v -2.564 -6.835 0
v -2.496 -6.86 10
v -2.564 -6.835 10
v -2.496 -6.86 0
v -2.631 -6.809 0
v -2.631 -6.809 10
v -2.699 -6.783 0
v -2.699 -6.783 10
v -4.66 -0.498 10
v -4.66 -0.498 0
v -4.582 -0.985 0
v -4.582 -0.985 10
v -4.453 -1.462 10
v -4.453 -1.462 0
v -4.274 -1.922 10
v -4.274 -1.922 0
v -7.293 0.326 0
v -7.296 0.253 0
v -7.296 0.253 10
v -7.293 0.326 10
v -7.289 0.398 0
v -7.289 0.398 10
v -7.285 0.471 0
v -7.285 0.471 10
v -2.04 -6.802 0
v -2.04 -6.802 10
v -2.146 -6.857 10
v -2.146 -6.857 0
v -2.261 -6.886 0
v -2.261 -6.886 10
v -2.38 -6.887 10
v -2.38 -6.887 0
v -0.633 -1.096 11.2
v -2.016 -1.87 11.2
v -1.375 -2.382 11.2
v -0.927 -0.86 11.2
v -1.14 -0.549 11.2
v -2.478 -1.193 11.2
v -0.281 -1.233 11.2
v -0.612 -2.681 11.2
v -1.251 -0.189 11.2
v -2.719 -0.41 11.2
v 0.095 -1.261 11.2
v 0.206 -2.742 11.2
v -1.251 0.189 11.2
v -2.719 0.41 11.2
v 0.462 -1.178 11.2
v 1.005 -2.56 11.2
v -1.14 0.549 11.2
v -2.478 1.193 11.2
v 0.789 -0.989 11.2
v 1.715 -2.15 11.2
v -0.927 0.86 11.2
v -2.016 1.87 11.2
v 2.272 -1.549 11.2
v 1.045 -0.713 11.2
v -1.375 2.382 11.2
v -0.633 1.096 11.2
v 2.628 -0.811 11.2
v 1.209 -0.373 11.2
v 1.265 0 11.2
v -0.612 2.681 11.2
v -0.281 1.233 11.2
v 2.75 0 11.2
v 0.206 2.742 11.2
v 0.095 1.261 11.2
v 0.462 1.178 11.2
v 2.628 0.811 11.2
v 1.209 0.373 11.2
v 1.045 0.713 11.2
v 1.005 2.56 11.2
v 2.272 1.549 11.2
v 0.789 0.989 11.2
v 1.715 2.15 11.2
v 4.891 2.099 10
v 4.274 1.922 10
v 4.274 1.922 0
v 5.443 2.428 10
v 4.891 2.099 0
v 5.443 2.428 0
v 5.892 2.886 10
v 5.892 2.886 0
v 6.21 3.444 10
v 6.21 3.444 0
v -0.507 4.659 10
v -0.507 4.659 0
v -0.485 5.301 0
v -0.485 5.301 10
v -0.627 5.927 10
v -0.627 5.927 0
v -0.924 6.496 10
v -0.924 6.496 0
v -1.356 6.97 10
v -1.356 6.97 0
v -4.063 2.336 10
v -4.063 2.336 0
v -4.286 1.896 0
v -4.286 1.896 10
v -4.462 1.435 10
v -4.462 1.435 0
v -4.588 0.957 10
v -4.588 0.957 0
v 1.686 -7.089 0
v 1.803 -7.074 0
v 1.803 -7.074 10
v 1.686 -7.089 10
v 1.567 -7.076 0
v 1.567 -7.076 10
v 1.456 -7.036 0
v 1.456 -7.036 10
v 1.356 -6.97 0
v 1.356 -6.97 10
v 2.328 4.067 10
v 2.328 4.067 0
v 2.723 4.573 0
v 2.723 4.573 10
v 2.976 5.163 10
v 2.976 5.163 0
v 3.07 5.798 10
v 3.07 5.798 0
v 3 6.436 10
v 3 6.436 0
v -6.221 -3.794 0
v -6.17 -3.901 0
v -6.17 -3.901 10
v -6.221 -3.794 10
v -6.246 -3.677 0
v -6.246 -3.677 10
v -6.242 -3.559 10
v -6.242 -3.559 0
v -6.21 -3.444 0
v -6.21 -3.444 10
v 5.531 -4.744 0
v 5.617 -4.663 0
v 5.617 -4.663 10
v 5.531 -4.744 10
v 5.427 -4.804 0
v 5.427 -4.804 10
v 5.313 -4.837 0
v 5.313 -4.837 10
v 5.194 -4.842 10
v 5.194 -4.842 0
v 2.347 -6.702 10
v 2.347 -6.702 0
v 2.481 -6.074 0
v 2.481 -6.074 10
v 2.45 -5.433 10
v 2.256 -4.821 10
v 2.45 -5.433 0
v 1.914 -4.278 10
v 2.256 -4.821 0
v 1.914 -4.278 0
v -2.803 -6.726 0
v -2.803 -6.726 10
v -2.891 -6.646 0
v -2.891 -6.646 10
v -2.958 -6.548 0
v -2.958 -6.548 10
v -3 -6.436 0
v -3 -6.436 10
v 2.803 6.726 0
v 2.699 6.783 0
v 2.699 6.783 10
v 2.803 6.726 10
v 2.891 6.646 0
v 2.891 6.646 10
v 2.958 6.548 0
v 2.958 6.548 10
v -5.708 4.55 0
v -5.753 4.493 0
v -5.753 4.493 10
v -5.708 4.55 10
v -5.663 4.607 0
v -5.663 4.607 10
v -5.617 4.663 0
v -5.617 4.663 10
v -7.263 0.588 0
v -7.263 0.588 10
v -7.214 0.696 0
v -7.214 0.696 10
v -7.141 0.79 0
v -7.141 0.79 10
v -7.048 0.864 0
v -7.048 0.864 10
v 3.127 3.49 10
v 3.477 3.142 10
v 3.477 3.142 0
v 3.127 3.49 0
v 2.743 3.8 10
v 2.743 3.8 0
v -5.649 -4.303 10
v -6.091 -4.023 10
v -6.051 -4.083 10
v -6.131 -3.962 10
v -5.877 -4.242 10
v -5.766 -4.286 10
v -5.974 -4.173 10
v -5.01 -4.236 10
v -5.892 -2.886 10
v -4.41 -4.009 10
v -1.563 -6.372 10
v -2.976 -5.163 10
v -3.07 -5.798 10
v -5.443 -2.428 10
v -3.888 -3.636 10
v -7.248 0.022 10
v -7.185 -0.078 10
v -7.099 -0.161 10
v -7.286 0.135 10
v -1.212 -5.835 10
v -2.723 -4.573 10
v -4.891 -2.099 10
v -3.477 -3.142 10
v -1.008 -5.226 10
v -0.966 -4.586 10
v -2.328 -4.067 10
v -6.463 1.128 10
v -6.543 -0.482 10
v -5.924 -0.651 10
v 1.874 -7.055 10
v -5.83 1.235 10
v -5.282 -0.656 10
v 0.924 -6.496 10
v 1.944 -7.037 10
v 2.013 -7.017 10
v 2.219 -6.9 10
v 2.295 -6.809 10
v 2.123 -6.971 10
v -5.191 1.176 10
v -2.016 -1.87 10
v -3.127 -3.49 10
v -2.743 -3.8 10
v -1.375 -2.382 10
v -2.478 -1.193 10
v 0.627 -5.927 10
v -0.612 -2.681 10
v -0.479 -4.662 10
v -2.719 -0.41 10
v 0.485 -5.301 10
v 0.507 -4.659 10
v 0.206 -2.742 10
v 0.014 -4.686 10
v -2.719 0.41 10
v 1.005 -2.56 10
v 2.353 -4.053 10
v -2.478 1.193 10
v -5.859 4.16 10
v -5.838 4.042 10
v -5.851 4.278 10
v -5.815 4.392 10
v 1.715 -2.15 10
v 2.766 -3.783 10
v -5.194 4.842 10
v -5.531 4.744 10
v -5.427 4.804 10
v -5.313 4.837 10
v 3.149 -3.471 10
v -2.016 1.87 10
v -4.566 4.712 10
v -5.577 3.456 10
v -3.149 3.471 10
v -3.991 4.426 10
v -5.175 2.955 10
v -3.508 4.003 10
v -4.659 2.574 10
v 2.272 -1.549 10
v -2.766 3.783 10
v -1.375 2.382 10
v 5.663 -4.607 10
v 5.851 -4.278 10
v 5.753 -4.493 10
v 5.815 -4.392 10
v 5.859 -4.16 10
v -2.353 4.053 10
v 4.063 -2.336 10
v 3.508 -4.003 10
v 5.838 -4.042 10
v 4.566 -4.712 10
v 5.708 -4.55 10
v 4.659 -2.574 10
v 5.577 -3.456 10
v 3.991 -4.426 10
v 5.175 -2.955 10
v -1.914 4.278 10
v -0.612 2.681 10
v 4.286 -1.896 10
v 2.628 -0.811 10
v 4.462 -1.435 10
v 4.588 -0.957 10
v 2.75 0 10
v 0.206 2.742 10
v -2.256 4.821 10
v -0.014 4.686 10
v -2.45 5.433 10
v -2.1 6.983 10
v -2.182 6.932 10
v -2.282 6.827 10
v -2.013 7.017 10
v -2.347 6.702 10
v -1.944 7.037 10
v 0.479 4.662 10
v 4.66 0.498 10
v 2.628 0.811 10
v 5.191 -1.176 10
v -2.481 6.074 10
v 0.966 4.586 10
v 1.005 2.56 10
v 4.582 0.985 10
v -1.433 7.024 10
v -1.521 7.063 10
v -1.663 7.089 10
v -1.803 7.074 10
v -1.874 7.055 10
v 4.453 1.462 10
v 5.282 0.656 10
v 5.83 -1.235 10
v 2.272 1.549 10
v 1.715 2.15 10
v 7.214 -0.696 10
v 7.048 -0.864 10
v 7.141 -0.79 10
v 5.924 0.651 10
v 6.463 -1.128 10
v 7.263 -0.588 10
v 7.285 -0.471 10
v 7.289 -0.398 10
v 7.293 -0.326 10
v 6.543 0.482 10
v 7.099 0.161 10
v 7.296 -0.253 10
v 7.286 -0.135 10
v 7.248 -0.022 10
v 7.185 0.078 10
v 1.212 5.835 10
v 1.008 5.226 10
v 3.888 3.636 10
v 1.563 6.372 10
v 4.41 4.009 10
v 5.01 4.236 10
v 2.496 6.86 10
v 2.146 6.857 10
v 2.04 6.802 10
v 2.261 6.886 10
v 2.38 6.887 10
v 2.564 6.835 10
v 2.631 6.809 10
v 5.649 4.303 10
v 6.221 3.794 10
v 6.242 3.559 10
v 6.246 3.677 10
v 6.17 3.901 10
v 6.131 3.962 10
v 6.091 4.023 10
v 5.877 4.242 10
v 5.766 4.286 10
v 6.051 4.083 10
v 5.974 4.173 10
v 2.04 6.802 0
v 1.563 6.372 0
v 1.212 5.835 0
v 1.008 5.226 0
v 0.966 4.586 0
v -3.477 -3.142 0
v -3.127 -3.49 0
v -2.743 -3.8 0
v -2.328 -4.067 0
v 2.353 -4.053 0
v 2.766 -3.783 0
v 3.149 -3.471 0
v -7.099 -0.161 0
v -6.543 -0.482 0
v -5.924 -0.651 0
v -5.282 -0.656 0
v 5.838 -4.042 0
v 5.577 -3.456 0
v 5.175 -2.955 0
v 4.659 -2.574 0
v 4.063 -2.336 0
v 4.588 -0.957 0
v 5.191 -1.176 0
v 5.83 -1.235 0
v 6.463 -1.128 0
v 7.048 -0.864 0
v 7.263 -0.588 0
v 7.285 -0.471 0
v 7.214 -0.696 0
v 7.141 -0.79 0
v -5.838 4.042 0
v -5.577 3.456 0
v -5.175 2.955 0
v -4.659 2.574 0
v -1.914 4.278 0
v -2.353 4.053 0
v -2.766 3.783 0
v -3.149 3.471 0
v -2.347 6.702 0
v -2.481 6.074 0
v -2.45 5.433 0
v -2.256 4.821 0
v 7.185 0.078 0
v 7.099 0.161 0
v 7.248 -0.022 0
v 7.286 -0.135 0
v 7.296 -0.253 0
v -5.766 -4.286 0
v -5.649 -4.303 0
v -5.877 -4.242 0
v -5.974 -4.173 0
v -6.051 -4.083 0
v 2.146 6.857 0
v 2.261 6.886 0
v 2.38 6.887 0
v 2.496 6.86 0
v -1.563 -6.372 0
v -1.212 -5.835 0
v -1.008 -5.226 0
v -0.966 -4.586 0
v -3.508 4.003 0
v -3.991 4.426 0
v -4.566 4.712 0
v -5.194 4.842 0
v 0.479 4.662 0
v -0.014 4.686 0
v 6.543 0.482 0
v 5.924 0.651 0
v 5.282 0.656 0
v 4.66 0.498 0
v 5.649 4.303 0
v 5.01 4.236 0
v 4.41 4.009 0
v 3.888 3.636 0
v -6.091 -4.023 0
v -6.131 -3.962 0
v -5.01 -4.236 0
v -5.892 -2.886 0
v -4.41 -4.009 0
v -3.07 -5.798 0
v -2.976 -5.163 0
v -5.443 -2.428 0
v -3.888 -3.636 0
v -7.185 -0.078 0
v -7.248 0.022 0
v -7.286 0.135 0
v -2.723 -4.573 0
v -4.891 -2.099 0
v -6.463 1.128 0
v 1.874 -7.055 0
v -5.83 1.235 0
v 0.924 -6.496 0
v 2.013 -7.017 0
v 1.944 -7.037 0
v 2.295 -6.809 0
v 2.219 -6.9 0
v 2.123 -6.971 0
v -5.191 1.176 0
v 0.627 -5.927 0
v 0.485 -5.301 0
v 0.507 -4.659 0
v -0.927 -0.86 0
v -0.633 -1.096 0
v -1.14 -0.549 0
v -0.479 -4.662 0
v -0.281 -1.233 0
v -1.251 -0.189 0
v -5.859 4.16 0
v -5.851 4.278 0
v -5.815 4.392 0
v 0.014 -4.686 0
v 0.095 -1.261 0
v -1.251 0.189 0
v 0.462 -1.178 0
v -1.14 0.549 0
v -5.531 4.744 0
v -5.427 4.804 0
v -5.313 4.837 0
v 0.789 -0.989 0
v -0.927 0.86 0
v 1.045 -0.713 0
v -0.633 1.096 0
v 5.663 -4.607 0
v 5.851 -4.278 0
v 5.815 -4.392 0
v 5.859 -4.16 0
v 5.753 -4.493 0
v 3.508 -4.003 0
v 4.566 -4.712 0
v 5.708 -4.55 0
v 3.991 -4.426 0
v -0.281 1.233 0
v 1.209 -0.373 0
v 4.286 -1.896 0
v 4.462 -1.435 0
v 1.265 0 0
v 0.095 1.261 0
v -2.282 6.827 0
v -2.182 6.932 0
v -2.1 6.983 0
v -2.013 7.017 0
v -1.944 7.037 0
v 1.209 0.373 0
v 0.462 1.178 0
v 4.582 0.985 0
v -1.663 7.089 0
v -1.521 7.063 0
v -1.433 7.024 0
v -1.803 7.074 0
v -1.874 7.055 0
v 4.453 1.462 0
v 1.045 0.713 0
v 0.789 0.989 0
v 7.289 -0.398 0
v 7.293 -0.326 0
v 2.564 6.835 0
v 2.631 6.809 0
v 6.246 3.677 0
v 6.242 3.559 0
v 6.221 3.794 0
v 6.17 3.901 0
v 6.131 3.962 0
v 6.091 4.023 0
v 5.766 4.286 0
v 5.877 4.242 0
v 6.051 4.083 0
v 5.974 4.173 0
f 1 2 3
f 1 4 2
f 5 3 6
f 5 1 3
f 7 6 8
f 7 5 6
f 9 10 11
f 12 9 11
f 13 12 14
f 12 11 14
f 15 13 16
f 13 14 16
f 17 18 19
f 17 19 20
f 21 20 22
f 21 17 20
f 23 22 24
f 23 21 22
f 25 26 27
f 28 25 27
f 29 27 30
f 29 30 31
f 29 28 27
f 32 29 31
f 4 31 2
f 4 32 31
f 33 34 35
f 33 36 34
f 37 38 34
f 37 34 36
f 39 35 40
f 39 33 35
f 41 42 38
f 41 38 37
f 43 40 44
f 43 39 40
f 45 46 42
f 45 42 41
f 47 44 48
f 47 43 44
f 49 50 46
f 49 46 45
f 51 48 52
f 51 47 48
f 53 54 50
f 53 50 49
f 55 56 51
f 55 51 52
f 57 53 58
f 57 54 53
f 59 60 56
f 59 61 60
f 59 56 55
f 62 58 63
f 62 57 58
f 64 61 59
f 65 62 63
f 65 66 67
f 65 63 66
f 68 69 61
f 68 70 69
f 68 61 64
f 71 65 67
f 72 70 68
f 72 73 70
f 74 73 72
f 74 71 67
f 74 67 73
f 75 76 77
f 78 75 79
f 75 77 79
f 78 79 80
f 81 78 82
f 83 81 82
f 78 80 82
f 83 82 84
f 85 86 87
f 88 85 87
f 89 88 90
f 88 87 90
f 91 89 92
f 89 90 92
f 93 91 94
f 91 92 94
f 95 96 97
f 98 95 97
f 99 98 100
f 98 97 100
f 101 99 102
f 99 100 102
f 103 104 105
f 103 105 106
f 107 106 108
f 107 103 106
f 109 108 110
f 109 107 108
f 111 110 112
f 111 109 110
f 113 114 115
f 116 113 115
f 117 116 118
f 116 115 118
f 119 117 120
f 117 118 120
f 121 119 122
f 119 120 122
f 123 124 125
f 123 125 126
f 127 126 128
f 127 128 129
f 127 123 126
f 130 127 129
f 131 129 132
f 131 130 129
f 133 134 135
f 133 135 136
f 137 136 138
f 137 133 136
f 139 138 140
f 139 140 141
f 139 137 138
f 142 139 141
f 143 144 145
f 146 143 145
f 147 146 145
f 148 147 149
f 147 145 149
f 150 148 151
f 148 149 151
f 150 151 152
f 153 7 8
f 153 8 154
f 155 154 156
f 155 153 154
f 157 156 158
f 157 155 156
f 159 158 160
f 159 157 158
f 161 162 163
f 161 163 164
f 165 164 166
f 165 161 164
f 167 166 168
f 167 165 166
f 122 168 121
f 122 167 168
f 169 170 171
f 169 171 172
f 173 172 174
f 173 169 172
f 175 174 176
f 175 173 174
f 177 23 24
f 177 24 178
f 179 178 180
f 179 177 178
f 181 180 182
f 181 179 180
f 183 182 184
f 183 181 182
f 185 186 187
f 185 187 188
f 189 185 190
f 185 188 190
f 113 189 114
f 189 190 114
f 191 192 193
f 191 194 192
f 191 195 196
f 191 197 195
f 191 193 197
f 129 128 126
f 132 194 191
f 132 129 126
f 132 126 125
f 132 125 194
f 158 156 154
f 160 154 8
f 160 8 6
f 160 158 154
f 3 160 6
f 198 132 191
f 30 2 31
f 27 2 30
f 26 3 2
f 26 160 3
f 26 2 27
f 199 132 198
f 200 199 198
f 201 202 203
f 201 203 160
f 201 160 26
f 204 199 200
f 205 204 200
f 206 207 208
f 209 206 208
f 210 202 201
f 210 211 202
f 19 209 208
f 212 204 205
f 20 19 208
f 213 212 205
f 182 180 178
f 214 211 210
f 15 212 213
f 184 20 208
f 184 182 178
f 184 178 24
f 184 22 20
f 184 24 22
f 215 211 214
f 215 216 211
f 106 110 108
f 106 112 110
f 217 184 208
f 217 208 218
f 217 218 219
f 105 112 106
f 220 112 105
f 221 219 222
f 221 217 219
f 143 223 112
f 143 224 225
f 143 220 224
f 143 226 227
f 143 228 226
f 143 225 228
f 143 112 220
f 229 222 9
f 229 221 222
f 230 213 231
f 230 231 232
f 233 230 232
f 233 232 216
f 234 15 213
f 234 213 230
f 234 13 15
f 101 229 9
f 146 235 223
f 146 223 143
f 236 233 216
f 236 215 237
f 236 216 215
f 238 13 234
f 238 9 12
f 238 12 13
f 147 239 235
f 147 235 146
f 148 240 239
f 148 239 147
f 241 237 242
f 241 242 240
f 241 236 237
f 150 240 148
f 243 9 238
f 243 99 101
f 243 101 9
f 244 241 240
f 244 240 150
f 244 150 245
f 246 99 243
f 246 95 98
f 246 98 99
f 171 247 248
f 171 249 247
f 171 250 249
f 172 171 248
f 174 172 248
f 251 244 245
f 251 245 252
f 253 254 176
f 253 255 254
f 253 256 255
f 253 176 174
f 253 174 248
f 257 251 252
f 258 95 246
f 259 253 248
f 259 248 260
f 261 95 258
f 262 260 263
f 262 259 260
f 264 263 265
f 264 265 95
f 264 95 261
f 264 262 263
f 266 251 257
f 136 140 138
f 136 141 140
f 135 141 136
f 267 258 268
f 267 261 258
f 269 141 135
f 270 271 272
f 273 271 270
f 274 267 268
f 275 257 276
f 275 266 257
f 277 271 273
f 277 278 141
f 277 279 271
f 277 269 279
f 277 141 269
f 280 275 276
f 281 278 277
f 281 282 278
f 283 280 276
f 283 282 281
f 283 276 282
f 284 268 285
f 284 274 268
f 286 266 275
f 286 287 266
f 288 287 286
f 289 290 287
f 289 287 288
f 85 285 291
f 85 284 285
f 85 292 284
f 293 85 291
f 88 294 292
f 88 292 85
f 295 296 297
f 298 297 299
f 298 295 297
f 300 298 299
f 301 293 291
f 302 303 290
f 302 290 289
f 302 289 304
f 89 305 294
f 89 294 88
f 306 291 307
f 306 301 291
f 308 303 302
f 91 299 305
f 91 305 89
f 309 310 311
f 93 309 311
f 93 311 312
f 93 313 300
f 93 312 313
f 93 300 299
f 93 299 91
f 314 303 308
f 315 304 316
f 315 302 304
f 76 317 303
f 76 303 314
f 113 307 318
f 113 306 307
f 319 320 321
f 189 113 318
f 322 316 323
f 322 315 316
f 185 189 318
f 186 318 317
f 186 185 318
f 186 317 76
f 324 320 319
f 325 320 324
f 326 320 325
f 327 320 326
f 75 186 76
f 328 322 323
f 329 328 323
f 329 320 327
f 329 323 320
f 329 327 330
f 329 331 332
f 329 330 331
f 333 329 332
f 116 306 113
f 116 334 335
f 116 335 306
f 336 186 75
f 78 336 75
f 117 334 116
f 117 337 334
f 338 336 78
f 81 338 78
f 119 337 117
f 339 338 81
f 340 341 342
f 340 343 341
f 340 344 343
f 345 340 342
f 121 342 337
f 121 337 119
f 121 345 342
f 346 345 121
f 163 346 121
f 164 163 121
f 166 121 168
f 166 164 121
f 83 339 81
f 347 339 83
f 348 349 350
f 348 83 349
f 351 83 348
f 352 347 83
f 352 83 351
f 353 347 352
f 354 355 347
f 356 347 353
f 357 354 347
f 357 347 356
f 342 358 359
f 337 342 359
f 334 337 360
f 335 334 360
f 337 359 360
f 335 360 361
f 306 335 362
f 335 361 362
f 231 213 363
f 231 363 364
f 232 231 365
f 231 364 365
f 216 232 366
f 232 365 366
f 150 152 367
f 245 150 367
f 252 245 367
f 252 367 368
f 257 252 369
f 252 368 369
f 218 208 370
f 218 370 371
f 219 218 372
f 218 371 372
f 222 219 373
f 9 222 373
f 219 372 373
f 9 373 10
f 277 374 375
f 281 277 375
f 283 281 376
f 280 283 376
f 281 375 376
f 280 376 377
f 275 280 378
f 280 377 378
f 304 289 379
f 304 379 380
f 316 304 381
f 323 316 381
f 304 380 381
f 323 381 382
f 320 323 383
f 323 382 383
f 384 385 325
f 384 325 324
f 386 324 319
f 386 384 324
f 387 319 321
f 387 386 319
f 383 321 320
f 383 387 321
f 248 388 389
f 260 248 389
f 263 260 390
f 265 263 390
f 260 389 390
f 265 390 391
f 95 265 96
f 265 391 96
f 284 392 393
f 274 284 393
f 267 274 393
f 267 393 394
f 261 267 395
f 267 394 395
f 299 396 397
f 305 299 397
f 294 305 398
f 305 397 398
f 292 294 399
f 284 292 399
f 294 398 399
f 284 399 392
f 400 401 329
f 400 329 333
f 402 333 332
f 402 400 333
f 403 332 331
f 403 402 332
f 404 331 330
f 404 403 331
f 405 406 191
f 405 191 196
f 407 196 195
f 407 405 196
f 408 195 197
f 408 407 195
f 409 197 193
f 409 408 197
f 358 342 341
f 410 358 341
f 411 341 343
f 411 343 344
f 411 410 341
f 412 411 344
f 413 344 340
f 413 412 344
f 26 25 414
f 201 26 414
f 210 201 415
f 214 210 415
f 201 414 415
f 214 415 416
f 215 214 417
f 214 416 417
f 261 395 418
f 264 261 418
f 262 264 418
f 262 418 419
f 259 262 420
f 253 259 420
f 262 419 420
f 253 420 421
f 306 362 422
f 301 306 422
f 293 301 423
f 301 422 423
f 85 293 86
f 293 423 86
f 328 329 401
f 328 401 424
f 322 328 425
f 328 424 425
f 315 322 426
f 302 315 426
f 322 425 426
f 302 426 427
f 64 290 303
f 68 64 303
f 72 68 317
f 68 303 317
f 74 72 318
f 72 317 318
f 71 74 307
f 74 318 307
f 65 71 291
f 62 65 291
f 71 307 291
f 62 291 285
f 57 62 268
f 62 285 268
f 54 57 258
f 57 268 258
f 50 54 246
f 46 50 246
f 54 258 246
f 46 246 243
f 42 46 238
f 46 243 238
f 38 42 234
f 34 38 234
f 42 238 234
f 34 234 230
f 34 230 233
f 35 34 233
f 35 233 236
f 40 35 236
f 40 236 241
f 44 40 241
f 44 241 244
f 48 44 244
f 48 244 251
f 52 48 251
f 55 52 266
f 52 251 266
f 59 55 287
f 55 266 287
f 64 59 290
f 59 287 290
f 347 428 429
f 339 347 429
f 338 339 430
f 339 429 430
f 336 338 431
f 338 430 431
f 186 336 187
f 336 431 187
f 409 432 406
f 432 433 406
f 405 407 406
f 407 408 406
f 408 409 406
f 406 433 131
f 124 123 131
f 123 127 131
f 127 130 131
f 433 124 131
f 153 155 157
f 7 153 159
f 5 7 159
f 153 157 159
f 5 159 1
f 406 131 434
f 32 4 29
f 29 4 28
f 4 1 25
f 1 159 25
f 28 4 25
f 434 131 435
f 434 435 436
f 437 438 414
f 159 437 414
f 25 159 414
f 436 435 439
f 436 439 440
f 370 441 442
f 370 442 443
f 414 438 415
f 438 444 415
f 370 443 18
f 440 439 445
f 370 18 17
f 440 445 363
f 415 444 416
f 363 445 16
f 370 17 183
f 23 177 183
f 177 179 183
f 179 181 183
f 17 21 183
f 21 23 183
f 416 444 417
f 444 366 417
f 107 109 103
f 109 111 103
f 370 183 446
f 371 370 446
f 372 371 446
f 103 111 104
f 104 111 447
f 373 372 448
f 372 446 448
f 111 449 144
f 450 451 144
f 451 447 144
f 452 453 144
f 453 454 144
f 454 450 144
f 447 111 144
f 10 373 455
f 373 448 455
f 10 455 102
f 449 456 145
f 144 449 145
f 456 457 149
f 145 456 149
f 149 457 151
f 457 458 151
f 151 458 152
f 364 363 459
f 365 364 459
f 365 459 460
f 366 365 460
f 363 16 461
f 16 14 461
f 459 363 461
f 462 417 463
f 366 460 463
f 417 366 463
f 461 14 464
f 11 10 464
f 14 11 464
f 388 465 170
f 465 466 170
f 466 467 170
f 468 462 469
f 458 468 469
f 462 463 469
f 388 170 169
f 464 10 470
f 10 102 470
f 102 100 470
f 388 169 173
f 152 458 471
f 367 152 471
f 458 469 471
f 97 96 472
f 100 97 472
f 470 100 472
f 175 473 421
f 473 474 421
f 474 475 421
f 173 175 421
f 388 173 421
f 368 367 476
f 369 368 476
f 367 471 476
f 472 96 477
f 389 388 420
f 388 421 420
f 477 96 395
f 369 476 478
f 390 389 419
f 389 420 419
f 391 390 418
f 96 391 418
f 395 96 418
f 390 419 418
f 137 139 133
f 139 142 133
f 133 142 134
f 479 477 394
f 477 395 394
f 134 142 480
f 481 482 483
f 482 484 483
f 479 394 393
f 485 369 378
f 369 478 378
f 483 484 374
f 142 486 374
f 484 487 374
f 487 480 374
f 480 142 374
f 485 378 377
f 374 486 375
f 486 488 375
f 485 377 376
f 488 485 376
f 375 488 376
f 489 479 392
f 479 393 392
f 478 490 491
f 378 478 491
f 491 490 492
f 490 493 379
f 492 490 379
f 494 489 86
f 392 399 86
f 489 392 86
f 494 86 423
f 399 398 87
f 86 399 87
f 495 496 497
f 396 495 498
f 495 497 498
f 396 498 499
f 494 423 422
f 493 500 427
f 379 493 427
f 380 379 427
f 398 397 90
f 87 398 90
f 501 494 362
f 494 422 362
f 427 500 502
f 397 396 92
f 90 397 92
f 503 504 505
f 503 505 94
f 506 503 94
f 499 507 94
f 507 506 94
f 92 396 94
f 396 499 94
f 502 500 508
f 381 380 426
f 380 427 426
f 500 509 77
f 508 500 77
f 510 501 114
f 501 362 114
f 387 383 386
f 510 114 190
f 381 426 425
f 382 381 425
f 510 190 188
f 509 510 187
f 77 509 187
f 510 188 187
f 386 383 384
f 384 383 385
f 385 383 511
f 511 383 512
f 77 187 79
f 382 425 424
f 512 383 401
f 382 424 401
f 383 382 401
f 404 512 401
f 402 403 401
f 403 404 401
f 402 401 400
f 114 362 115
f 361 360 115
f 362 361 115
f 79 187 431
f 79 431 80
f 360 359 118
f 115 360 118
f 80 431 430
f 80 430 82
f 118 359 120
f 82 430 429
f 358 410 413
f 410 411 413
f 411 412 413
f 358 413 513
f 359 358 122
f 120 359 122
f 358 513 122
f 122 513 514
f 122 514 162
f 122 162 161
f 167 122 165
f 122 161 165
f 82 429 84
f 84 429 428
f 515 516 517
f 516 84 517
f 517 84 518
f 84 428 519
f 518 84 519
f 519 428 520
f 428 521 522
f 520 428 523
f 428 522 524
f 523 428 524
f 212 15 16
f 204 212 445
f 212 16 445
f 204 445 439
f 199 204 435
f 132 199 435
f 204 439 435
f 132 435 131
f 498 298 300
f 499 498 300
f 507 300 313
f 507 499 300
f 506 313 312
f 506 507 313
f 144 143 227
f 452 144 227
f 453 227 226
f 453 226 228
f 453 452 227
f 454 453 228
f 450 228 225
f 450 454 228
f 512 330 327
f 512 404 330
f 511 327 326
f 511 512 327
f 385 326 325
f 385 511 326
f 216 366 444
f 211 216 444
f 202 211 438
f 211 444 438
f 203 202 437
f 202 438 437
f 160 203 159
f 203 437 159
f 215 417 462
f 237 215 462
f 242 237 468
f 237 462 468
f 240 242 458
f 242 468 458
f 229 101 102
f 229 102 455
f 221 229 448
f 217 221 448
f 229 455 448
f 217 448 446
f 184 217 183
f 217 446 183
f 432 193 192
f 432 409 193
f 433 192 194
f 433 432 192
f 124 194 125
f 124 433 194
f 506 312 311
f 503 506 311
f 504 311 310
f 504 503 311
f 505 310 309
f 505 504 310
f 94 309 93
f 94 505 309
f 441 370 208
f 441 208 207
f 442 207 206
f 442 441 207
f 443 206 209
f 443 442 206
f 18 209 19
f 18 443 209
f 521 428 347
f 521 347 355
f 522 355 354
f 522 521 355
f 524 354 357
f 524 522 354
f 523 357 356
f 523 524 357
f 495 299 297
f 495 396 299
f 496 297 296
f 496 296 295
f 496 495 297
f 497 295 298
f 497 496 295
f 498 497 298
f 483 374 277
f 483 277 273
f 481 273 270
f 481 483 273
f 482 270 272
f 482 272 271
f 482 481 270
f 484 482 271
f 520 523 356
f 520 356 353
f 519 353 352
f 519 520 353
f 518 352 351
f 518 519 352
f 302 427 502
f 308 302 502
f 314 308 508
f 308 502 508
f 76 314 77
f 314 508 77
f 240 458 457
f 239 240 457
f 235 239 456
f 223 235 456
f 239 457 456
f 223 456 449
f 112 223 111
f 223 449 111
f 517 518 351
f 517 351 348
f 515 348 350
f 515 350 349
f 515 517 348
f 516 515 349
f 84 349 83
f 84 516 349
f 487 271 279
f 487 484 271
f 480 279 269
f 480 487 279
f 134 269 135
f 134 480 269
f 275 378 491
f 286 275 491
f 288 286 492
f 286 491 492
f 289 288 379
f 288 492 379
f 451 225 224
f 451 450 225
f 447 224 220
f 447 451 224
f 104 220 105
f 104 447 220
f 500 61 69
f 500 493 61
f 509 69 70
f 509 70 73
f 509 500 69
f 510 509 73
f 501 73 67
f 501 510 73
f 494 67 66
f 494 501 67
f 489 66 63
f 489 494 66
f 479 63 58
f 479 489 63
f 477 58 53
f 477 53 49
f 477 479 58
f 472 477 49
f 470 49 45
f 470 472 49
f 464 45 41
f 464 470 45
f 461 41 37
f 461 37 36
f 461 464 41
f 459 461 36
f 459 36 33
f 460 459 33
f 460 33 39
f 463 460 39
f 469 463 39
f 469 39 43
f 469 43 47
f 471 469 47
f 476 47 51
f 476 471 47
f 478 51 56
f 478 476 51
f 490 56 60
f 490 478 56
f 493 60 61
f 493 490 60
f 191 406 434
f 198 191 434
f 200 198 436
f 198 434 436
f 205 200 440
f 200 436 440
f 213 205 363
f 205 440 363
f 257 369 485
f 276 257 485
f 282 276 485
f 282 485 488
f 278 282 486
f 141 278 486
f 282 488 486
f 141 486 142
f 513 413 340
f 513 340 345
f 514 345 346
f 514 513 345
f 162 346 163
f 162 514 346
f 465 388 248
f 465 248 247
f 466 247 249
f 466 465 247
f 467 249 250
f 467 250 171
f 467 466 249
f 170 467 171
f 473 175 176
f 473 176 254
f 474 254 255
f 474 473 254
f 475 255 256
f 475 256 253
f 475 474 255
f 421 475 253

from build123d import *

# Parameters (mm, degrees)
SKETCH_1_R               = 1.265
EXTRUDE_1_DEPTH          = 10
SKETCH_2_R               = 2.75
SKETCH_2_R_2             = 1.265
EXTRUDE_2_DEPTH          = 1.2
SKETCH_3_R               = 10.210079725
SKETCH_3_R_2             = 7.3
CUT_EXTRUDE_2_DEPTH      = 16.316956182
FILLET_1_R               = 0.5
PATTERN_CIRCULAR_2_DEPTH = 10


# Read off the part's stored shape, not the designer's step: Круговой массив2
with BuildPart() as part:
    # Эскиз1 → Бобышка-Вытянуть1 (new body)
    with BuildSketch(Plane.XY):
        with BuildLine():
            ThreePointArc((-3.148803906, 3.471068454), (-4.227852242, 4.566214035), (-5.743712894, 4.822837566))
            ThreePointArc((-5.743712894, 4.822837566), (-5.841480421, 4.703945843), (-5.936787387, 4.583072716))
            ThreePointArc((-5.936787387, 4.583072716), (-5.362797198, 3.156810321), (-4.062728379, 2.336133637))
            ThreePointArc((-4.062728379, 2.336133637), (-4.379801209, 1.667520202), (-4.587678719, 0.95733287))
            ThreePointArc((-4.587678719, 0.95733287), (-6.104357582, 1.209075557), (-7.481554138, 0.525687819))
            ThreePointArc((-7.481554138, 0.525687819), (-7.490766927, 0.372036085), (-7.496824441, 0.218227641))
            ThreePointArc((-7.496824441, 0.218227641), (-6.194120622, -0.598259906), (-4.659961201, -0.498040012))
            ThreePointArc((-4.659961201, -0.498040012), (-4.523477392, -1.225330377), (-4.274216191, -1.922071332))
            ThreePointArc((-4.274216191, -1.922071332), (-5.649205805, -2.609888688), (-6.361695989, -3.972256807))
            ThreePointArc((-6.361695989, -3.972256807), (-6.278835069, -4.101978813), (-6.193329365, -4.229972975))
            ThreePointArc((-6.193329365, -4.229972975), (-4.659500498, -4.124815183), (-3.477247231, -3.141979304))
            ThreePointArc((-3.477247231, -3.141979304), (-2.939338959, -3.650146399), (-2.328148353, -4.067309614))
            ThreePointArc((-2.328148353, -4.067309614), (-3.03624942, -5.431964161), (-2.811886199, -6.952934345))
            ThreePointArc((-2.811886199, -6.952934345), (-2.668601624, -7.009177225), (-2.524192976, -7.062467686))
            ThreePointArc((-2.524192976, -7.062467686), (-1.345109555, -6.075831258), (-0.966343005, -4.585789294))
            ThreePointArc((-0.966343005, -4.585789294), (-0.232472948, -4.68073056), (0.507193024, -4.658973866))
            ThreePointArc((0.507193024, -4.658973866), (0.736451045, -6.179213951), (1.811968547, -7.277827285))
            ThreePointArc((1.811968547, -7.277827285), (1.960946938, -7.239108171), (2.109099336, -7.197339786))
            ThreePointArc((2.109099336, -7.197339786), (2.483067519, -5.706086302), (1.913671403, -4.277983638))
            ThreePointArc((1.913671403, -4.277983638), (2.563189827, -3.92343474), (3.148803906, -3.471068454))
            ThreePointArc((3.148803906, -3.471068454), (4.227852242, -4.566214035), (5.743712894, -4.822837566))
            ThreePointArc((5.743712894, -4.822837566), (5.841480421, -4.703945843), (5.936787387, -4.583072716))
            ThreePointArc((5.936787387, -4.583072716), (5.362797198, -3.156810321), (4.062728379, -2.336133637))
            ThreePointArc((4.062728379, -2.336133637), (4.379801209, -1.667520202), (4.587678719, -0.95733287))
            ThreePointArc((4.587678719, -0.95733287), (6.104357582, -1.209075557), (7.481554138, -0.525687819))
            ThreePointArc((7.481554138, -0.525687819), (7.490766927, -0.372036085), (7.496824441, -0.218227641))
            ThreePointArc((7.496824441, -0.218227641), (6.194120622, 0.598259906), (4.659961201, 0.498040012))
            ThreePointArc((4.659961201, 0.498040012), (4.523477392, 1.225330377), (4.274216191, 1.922071332))
            ThreePointArc((4.274216191, 1.922071332), (5.649205805, 2.609888688), (6.361695989, 3.972256807))
            ThreePointArc((6.361695989, 3.972256807), (6.278835069, 4.101978813), (6.193329365, 4.229972975))
            ThreePointArc((6.193329365, 4.229972975), (4.659500498, 4.124815183), (3.477247231, 3.141979304))
            ThreePointArc((3.477247231, 3.141979304), (2.939338959, 3.650146399), (2.328148353, 4.067309614))
            ThreePointArc((2.328148353, 4.067309614), (3.03624942, 5.431964161), (2.811886199, 6.952934345))
            ThreePointArc((2.811886199, 6.952934345), (2.668601624, 7.009177225), (2.524192976, 7.062467686))
            ThreePointArc((2.524192976, 7.062467686), (1.345109555, 6.075831258), (0.966343005, 4.585789294))
            ThreePointArc((0.966343005, 4.585789294), (0.232472948, 4.68073056), (-0.507193024, 4.658973866))
            ThreePointArc((-0.507193024, 4.658973866), (-0.736451045, 6.179213951), (-1.811968547, 7.277827285))
            ThreePointArc((-1.811968547, 7.277827285), (-1.960946938, 7.239108171), (-2.109099336, 7.197339786))
            ThreePointArc((-2.109099336, 7.197339786), (-2.483067519, 5.706086302), (-1.913671403, 4.277983638))
            ThreePointArc((-1.913671403, 4.277983638), (-2.563189827, 3.92343474), (-3.148803906, 3.471068454))
        make_face()
        Circle(SKETCH_1_R, mode=Mode.SUBTRACT)
    extrude(amount=EXTRUDE_1_DEPTH)

    # Эскиз2 → Бобышка-Вытянуть2 (add)
    with BuildSketch(Plane.XY.offset(10)):
        Circle(SKETCH_2_R)
        Circle(SKETCH_2_R_2, mode=Mode.SUBTRACT)
    extrude(amount=EXTRUDE_2_DEPTH)

    # Эскиз3 → Вырез-Вытянуть2 (cut, through all)
    with BuildSketch(Plane(origin=(0, 0, 0), x_dir=(-1, 0, 0), z_dir=(0, 0, -1))):
        Circle(SKETCH_3_R)
        Circle(SKETCH_3_R_2, mode=Mode.SUBTRACT)
    extrude(amount=-CUT_EXTRUDE_2_DEPTH, mode=Mode.SUBTRACT)

    # Скругление1
    fillet_1_edges = [part.edges().sort_by_distance(p)[0] for p in [
        (-2.246892365, 6.945608303, 5),
        (-1.565958675, 7.13006125, 5),
    ]]
    fillet(fillet_1_edges, radius=FILLET_1_R)

    # Круговой массив2 outline → Круговой массив2 (cut)
    with BuildSketch(Plane.XY):
        with BuildLine():
            ThreePointArc((-5.838293306, 4.042408612), (-5.850561559, 4.278183981), (-5.753278974, 4.493304024))
            ThreePointArc((-5.753278974, 4.493304024), (-5.827604273, 4.396479095), (-5.900300237, 4.298424958))
            ThreePointArc((-5.900300237, 4.298424958), (-5.872671085, 4.169599529), (-5.838293306, 4.042408612))
        make_face()
        with BuildLine():
            ThreePointArc((-5.457832031, 4.847893307), (-5.538127486, 4.755958783), (-5.61687454, 4.662694543))
            ThreePointArc((-5.61687454, 4.662694543), (-5.427449488, 4.803615386), (-5.19448163, 4.841910441))
            ThreePointArc((-5.19448163, 4.841910441), (-5.326077976, 4.84837285), (-5.457832031, 4.847893307))
        make_face()
        with BuildLine():
            ThreePointArc((-7.099346669, -0.161285439), (-7.247857179, 0.022249743), (-7.295598302, 0.253466783))
            ThreePointArc((-7.295598302, 0.253466783), (-7.298816468, 0.131446456), (-7.299993962, 0.009389377))
            ThreePointArc((-7.299993962, 0.009389377), (-7.201919821, -0.078592576), (-7.099346669, -0.161285439))
        make_face()
        with BuildLine():
            ThreePointArc((-7.264999056, 0.713994895), (-7.275921686, 0.592421818), (-7.284810046, 0.470683106))
            ThreePointArc((-7.284810046, 0.470683106), (-7.214393154, 0.696031715), (-7.048427465, 0.863948137))
            ThreePointArc((-7.048427465, 0.863948137), (-7.158689654, 0.791825944), (-7.264999056, 0.713994895))
        make_face()
        with BuildLine():
            ThreePointArc((-5.648690902, -4.303373934), (-5.876717701, -4.24218314), (-6.051247048, -4.083186154))
            ThreePointArc((-6.051247048, -4.083186154), (-5.982128849, -4.183794263), (-5.911338111, -4.283232627))
            ThreePointArc((-5.911338111, -4.283232627), (-5.78027997, -4.296764989), (-5.648690902, -4.303373934))
        make_face()
        with BuildLine():
            ThreePointArc((-6.29718337, -3.692625299), (-6.234561102, -3.797400146), (-6.170195716, -3.90111328))
            ThreePointArc((-6.170195716, -3.90111328), (-6.245683843, -3.677412414), (-6.210113576, -3.444012991))
            ThreePointArc((-6.210113576, -3.444012991), (-6.2569252, -3.567171559), (-6.29718337, -3.692625299))
        make_face()
        with BuildLine():
            ThreePointArc((-2.040427202, -6.801719852), (-2.260871804, -6.88624625), (-2.495525095, -6.860200762))
            ThreePointArc((-2.495525095, -6.860200762), (-2.380471335, -6.900967774), (-2.264752021, -6.939805349))
            ThreePointArc((-2.264752021, -6.939805349), (-2.150769635, -6.873719217), (-2.040427202, -6.801719852))
        make_face()
        with BuildLine():
            ThreePointArc((-2.92405767, -6.688788137), (-2.811810081, -6.736744322), (-2.69877634, -6.782816986))
            ThreePointArc((-2.69877634, -6.782816986), (-2.891335587, -6.646209992), (-2.999747375, -6.436478214))
            ThreePointArc((-2.999747375, -6.436478214), (-2.965227985, -6.563630771), (-2.92405767, -6.688788137))
        make_face()
        with BuildLine():
            ThreePointArc((2.347210337, -6.702039969), (2.218550278, -6.899997348), (2.013402624, -7.016851849))
            ThreePointArc((2.013402624, -7.016851849), (2.130445319, -6.982206151), (2.246892365, -6.945608303))
            ThreePointArc((2.246892365, -6.945608303), (2.300261598, -6.825146334), (2.347210337, -6.702039969))
        make_face()
        with BuildLine():
            ThreePointArc((1.565958675, -7.13006125), (1.684956821, -7.102881142), (1.80348387, -7.073715143))
            ThreePointArc((1.80348387, -7.073715143), (1.56740459, -7.076381249), (1.356420365, -6.970427527))
            ThreePointArc((1.356420365, -6.970427527), (1.459085537, -7.053006118), (1.565958675, -7.13006125))
        make_face()
        with BuildLine():
            ThreePointArc((5.838293306, -4.042408612), (5.850561559, -4.278183981), (5.753278974, -4.493304024))
            ThreePointArc((5.753278974, -4.493304024), (5.827604273, -4.396479095), (5.900300237, -4.298424958))
            ThreePointArc((5.900300237, -4.298424958), (5.872671085, -4.169599529), (5.838293306, -4.042408612))
        make_face()
        with BuildLine():
            ThreePointArc((5.457832031, -4.847893307), (5.538127486, -4.755958783), (5.61687454, -4.662694543))
            ThreePointArc((5.61687454, -4.662694543), (5.427449488, -4.803615386), (5.19448163, -4.841910441))
            ThreePointArc((5.19448163, -4.841910441), (5.326077976, -4.84837285), (5.457832031, -4.847893307))
        make_face()
        with BuildLine():
            ThreePointArc((7.099346669, 0.161285439), (7.247857179, -0.022249743), (7.295598302, -0.253466783))
            ThreePointArc((7.295598302, -0.253466783), (7.298816468, -0.131446456), (7.299993962, -0.009389377))
            ThreePointArc((7.299993962, -0.009389377), (7.201919821, 0.078592576), (7.099346669, 0.161285439))
        make_face()
        with BuildLine():
            ThreePointArc((7.264999056, -0.713994895), (7.275921686, -0.592421818), (7.284810046, -0.470683106))
            ThreePointArc((7.284810046, -0.470683106), (7.214393154, -0.696031715), (7.048427465, -0.863948137))
            ThreePointArc((7.048427465, -0.863948137), (7.158689654, -0.791825944), (7.264999056, -0.713994895))
        make_face()
        with BuildLine():
            ThreePointArc((5.648690902, 4.303373934), (5.876717701, 4.24218314), (6.051247048, 4.083186154))
            ThreePointArc((6.051247048, 4.083186154), (5.982128849, 4.183794263), (5.911338111, 4.283232627))
            ThreePointArc((5.911338111, 4.283232627), (5.78027997, 4.296764989), (5.648690902, 4.303373934))
        make_face()
        with BuildLine():
            ThreePointArc((6.29718337, 3.692625299), (6.234561102, 3.797400146), (6.170195716, 3.90111328))
            ThreePointArc((6.170195716, 3.90111328), (6.245683843, 3.677412414), (6.210113576, 3.444012991))
            ThreePointArc((6.210113576, 3.444012991), (6.2569252, 3.567171559), (6.29718337, 3.692625299))
        make_face()
        with BuildLine():
            ThreePointArc((2.040427202, 6.801719852), (2.260871804, 6.88624625), (2.495525095, 6.860200762))
            ThreePointArc((2.495525095, 6.860200762), (2.380471335, 6.900967774), (2.264752021, 6.939805349))
            ThreePointArc((2.264752021, 6.939805349), (2.150769635, 6.873719217), (2.040427202, 6.801719852))
        make_face()
        with BuildLine():
            ThreePointArc((2.92405767, 6.688788137), (2.811810081, 6.736744322), (2.69877634, 6.782816986))
            ThreePointArc((2.69877634, 6.782816986), (2.891335587, 6.646209992), (2.999747375, 6.436478214))
            ThreePointArc((2.999747375, 6.436478214), (2.965227985, 6.563630771), (2.92405767, 6.688788137))
        make_face()
    extrude(amount=PATTERN_CIRCULAR_2_DEPTH, mode=Mode.SUBTRACT)


solid = part.part
